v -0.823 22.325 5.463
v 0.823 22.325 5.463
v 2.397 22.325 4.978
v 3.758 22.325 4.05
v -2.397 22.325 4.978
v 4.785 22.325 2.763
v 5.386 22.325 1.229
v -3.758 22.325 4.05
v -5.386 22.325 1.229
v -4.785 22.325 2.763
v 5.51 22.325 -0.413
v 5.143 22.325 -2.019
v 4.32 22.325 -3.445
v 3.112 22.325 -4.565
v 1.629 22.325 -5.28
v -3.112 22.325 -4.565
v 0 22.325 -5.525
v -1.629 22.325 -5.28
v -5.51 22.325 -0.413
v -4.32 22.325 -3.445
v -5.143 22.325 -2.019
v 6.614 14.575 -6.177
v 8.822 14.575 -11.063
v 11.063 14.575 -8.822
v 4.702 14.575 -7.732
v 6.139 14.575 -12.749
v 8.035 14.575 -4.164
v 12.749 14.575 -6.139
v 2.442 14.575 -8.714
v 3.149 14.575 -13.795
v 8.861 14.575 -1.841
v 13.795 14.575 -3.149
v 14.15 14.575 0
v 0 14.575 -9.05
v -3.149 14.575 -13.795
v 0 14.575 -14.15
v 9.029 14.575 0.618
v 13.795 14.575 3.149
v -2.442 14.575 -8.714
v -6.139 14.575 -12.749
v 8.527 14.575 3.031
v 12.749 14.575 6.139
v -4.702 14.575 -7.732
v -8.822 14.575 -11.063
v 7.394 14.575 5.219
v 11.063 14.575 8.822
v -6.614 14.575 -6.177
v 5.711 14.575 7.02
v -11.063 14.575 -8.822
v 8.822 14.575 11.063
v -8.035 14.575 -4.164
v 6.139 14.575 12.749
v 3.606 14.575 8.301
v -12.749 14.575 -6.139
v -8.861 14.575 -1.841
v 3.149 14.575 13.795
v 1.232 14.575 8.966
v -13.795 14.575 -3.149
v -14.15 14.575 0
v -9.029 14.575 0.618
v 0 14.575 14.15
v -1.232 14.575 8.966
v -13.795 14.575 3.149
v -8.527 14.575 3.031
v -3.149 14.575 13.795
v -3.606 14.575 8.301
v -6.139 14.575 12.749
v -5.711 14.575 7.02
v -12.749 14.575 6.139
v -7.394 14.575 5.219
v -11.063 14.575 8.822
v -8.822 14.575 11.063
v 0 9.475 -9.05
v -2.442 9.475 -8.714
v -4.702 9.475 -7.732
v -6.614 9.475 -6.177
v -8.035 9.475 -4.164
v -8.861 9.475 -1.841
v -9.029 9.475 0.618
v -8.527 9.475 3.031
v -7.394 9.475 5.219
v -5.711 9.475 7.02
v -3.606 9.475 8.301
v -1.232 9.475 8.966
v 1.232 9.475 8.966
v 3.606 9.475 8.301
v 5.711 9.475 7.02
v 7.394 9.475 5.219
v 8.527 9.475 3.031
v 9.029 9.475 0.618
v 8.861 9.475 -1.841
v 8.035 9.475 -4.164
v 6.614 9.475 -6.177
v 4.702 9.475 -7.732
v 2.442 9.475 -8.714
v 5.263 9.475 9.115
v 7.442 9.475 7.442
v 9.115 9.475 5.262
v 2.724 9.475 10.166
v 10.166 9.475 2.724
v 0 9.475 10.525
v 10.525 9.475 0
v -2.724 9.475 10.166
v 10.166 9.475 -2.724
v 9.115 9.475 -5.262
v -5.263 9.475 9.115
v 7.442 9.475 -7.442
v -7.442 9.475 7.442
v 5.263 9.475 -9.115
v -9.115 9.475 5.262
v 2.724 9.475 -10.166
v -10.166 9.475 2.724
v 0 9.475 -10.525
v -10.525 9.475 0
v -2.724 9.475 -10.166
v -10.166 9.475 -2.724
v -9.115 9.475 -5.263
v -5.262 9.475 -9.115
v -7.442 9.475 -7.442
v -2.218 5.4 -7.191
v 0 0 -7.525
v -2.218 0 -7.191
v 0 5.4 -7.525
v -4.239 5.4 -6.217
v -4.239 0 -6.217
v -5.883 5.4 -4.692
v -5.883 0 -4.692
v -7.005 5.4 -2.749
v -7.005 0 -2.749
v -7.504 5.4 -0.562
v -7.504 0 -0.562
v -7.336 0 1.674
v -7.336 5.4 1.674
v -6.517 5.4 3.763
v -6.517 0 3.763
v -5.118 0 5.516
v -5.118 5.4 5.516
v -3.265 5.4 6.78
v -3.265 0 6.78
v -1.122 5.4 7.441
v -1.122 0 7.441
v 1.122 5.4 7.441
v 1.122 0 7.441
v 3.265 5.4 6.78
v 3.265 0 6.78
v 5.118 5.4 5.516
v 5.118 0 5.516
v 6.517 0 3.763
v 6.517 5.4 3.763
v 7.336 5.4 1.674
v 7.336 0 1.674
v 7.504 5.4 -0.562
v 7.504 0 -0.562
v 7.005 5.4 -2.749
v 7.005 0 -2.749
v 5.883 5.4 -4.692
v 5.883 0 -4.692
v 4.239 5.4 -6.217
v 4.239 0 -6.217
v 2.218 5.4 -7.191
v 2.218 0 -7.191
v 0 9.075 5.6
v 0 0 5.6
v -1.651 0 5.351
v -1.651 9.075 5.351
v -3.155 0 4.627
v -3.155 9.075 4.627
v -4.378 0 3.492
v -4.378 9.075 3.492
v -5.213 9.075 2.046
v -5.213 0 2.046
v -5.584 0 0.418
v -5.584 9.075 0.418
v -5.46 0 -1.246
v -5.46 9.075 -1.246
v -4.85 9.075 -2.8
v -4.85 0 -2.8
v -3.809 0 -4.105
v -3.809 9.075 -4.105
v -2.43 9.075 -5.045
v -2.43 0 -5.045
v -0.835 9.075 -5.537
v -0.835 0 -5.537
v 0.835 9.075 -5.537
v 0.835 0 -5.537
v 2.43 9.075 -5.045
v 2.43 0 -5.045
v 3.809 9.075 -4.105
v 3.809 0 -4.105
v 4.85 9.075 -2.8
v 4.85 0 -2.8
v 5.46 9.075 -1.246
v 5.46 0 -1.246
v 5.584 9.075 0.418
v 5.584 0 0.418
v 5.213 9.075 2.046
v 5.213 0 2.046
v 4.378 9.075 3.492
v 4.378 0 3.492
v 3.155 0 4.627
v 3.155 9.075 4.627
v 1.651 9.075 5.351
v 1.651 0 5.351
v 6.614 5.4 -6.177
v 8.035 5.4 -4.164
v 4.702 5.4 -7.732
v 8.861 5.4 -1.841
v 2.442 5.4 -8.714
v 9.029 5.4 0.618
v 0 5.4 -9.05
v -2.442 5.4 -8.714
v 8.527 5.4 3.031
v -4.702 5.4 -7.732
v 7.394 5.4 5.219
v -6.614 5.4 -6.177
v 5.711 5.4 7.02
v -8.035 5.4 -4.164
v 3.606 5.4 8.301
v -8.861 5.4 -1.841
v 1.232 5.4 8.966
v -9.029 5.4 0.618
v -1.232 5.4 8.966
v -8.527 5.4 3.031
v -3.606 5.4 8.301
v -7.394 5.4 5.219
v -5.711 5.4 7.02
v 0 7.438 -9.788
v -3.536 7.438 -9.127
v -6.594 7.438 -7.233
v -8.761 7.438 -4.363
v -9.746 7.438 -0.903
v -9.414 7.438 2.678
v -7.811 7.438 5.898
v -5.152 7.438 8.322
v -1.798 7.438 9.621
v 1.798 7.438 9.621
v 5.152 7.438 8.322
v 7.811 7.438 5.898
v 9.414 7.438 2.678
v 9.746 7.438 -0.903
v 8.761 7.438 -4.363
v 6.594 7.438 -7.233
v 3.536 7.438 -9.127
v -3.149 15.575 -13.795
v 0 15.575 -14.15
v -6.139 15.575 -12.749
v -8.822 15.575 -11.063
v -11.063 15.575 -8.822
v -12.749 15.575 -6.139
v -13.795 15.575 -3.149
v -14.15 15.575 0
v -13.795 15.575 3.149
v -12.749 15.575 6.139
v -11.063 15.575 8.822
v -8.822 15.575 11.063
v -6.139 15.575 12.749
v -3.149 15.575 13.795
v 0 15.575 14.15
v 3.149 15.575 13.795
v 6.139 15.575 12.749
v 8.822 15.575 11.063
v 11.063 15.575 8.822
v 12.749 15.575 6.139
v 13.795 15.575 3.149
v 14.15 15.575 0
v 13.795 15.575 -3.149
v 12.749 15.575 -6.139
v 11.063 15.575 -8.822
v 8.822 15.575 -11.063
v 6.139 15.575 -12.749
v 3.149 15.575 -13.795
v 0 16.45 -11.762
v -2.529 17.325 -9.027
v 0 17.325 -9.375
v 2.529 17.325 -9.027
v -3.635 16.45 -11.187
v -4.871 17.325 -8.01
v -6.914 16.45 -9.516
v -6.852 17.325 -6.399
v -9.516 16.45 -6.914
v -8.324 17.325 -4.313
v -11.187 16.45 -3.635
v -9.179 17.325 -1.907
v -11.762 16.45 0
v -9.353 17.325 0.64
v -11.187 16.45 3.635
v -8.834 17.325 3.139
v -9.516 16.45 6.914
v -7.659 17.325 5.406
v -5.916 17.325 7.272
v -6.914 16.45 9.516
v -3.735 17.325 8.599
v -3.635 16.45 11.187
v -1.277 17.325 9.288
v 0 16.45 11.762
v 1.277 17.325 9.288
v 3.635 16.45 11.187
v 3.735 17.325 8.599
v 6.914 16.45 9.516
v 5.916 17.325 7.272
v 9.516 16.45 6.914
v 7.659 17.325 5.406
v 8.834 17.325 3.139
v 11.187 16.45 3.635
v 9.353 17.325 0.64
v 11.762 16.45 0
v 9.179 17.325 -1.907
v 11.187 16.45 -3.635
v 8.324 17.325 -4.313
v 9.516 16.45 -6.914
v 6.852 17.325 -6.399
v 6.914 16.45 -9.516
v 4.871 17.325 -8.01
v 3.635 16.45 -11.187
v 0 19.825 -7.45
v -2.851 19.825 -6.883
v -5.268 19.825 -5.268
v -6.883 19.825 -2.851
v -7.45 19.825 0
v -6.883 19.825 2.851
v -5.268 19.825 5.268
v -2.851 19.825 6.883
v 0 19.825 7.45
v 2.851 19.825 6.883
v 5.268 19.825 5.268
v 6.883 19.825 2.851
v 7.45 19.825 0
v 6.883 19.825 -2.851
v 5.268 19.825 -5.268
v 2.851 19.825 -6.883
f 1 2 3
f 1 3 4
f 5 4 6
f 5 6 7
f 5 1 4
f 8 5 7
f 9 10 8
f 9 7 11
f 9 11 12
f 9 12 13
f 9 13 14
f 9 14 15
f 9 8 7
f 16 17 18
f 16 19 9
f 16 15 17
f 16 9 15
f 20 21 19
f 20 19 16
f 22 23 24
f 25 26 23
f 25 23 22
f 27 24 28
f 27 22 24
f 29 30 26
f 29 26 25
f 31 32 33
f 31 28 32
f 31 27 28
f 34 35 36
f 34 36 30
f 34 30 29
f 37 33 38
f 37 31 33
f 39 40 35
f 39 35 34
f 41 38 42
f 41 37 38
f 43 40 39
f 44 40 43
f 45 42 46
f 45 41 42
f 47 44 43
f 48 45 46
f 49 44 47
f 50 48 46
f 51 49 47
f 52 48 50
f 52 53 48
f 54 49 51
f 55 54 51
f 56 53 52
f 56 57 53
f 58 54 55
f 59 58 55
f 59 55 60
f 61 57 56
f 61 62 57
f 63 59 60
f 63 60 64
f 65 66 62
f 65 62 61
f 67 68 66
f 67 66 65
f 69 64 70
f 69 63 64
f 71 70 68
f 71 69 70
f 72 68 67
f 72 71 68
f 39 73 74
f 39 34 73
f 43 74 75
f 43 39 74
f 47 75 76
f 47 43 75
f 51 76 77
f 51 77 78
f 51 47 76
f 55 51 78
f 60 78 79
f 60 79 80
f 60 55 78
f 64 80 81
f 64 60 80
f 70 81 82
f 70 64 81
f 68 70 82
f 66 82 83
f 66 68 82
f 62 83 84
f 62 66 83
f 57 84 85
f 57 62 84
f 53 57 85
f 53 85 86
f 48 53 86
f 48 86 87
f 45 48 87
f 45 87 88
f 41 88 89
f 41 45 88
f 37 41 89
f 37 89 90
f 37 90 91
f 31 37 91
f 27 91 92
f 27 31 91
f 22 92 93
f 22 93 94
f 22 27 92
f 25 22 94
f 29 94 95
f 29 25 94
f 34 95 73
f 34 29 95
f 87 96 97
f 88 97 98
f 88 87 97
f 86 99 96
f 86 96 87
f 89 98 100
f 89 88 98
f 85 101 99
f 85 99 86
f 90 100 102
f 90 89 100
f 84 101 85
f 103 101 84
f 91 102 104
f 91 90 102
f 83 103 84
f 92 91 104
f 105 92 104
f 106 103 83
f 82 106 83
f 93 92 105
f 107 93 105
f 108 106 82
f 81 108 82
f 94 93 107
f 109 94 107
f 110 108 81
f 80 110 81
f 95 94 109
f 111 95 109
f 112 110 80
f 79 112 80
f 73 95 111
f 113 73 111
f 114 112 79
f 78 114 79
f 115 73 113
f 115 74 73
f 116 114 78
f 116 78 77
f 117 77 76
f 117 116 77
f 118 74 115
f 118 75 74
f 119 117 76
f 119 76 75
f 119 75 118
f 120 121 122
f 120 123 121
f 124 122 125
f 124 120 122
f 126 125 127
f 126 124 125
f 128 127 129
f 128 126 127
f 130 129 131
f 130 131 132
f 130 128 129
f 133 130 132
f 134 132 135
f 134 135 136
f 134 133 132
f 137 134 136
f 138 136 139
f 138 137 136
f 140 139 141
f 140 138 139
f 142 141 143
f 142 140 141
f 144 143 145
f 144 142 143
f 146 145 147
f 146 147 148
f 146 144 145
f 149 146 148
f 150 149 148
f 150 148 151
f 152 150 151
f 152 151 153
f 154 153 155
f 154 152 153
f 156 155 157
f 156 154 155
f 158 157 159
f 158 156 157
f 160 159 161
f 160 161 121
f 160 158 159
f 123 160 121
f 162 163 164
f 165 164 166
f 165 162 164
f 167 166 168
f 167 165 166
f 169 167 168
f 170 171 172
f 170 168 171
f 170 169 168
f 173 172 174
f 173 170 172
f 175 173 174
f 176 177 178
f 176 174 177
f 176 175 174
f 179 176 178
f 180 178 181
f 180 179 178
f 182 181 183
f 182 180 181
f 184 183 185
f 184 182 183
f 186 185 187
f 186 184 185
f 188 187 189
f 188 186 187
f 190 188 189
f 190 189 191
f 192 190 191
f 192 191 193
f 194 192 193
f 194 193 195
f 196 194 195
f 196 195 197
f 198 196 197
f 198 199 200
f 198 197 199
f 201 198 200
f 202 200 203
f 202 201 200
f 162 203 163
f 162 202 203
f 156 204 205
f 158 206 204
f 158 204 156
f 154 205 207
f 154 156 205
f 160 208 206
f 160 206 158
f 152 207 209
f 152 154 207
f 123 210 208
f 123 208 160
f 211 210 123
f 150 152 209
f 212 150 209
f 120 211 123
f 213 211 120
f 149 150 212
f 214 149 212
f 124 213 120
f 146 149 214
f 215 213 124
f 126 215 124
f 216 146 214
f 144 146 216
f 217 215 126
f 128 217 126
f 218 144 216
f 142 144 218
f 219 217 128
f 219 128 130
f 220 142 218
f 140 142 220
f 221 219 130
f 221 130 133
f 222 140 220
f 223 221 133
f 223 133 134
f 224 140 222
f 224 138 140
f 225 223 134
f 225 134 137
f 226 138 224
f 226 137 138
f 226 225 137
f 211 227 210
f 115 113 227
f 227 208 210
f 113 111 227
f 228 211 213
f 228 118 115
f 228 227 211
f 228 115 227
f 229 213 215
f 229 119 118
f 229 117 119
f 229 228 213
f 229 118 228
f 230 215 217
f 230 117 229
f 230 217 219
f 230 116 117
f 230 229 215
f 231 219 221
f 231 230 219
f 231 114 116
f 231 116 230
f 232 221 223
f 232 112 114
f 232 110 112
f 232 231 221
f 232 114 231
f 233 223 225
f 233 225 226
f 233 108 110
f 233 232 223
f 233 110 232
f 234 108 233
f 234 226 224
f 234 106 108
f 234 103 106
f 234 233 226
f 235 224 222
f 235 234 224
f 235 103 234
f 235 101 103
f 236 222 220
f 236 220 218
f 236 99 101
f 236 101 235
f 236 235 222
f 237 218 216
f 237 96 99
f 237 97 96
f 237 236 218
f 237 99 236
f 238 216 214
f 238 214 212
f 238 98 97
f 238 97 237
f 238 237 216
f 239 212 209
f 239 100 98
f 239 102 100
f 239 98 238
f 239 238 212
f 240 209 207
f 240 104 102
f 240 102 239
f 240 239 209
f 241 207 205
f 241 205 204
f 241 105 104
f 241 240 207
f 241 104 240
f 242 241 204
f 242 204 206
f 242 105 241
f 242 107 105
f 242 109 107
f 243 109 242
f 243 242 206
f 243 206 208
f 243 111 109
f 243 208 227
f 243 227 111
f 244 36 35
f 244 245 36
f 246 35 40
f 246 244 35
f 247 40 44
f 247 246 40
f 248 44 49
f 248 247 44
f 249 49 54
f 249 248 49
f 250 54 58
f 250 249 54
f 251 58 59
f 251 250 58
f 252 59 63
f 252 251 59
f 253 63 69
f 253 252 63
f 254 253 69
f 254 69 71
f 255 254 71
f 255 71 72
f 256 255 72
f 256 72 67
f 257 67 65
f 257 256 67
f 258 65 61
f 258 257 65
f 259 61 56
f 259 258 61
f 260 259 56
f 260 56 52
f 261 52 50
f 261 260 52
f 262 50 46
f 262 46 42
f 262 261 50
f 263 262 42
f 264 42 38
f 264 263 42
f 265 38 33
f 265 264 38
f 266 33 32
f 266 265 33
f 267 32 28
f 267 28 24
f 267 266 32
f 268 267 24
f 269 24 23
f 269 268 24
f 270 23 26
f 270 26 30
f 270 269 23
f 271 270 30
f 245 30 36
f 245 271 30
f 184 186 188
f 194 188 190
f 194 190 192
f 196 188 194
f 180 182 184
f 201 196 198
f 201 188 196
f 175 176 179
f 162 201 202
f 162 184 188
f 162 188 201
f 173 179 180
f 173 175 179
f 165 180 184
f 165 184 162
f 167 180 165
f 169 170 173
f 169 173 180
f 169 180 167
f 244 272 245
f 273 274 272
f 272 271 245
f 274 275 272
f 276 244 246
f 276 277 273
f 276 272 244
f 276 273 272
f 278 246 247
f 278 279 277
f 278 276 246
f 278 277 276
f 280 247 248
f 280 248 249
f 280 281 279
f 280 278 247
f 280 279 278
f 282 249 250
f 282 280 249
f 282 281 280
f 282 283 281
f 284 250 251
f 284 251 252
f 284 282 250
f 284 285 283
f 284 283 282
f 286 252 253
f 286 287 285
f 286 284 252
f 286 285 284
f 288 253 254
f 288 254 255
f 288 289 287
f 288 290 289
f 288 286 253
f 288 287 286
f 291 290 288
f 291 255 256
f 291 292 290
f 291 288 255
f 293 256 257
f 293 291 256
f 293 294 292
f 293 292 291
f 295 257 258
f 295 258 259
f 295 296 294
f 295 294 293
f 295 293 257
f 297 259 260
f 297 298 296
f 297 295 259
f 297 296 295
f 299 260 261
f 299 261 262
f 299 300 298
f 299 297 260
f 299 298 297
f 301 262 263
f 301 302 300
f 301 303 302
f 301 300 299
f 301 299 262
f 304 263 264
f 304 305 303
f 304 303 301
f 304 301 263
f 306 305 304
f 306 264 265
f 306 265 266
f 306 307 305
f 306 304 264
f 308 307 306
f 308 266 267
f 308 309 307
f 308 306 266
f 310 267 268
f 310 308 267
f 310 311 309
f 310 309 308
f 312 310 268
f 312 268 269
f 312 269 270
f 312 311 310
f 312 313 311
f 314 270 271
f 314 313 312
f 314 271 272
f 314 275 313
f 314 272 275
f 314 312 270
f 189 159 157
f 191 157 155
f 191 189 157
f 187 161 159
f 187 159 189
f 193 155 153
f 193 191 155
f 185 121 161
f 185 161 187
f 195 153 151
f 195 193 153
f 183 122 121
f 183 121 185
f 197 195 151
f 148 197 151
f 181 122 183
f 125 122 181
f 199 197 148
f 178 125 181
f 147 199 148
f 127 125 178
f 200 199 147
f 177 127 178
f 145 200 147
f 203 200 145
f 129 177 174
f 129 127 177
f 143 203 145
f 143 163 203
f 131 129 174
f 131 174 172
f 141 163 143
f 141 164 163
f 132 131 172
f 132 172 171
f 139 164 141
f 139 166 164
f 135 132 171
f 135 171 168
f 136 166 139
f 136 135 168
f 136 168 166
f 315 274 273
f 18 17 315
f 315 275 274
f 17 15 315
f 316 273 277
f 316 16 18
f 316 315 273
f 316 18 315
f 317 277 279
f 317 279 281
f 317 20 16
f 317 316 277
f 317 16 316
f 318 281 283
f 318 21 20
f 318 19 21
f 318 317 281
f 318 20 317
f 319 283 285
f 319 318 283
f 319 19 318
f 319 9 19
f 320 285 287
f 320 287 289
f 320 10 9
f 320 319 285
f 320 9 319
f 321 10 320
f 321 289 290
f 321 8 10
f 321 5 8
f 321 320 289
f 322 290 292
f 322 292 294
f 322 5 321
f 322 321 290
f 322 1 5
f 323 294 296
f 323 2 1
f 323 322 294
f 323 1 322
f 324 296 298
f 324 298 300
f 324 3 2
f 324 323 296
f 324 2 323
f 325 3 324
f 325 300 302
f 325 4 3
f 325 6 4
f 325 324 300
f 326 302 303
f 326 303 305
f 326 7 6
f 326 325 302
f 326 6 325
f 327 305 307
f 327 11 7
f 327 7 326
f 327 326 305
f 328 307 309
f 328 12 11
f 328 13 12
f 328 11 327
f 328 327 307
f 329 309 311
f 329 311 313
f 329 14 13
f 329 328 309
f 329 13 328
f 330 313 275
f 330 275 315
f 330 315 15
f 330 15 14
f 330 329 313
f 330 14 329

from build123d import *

# Parameters (mm, degrees)
CUT_EXTRUDE_1_DEPTH      = 30.98083763
CUT_EXTRUDE_1_DEPTH_BACK = 9.075
SKETCH_2_R               = 5.6


with BuildPart() as part:
    # Эскиз1 → Повернуть1 (revolve)
    with BuildSketch(Plane.XY, mode=Mode.PRIVATE) as revolve_1_sk:
        Polygon((0, 0), (-7.525, 0), (-7.525, 5.4), (-9.05, 5.4), (-10.525, 9.475), (-9.05, 9.475), (-9.05, 14.575), (-14.15, 14.575), (-14.15, 15.575), (-9.375, 17.325), (-5.525, 22.325), (0, 22.325), align=None)
    revolve(revolve_1_sk.sketch.rotate(Axis((0, 0, 0), (0, 1, 0)), 270), axis=Axis((0, 0, 0), (0, 1, 0)))

    # Эскиз2 → Вырез-Вытянуть1 (cut, two sides: drawn at the far end of the back side and taken through both)
    with BuildSketch(Plane.XZ.offset(-CUT_EXTRUDE_1_DEPTH_BACK)):
        with Locations(Location((0, 0, 0), (0, 0, 90))):
            Circle(SKETCH_2_R)
    extrude(amount=CUT_EXTRUDE_1_DEPTH + CUT_EXTRUDE_1_DEPTH_BACK, mode=Mode.SUBTRACT)


solid = part.part
